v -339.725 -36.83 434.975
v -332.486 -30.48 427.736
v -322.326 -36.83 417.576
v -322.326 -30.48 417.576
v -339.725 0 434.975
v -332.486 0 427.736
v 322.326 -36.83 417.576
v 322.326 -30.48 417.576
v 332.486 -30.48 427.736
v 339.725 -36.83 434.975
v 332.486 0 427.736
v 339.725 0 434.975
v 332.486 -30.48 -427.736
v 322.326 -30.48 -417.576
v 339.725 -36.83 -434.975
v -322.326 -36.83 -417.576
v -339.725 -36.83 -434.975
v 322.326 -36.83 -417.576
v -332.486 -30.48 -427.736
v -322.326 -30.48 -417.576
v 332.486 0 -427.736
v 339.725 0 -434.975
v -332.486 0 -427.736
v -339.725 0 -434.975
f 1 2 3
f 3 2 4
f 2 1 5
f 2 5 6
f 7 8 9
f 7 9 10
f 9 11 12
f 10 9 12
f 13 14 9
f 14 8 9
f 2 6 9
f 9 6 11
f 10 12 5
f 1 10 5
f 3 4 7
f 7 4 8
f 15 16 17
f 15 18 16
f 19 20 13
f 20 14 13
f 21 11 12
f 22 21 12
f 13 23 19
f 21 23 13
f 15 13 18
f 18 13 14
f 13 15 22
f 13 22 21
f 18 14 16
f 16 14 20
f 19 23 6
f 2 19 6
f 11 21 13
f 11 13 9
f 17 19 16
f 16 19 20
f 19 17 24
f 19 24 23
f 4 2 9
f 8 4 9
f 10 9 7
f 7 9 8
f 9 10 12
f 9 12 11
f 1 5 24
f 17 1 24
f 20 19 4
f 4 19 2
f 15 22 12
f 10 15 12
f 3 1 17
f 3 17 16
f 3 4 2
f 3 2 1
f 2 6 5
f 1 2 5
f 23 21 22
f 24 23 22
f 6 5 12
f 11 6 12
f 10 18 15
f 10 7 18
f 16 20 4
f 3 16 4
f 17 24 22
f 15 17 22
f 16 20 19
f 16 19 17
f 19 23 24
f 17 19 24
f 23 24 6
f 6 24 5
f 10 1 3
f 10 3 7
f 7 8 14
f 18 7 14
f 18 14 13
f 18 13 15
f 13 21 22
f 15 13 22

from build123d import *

# Parameters (mm, degrees)
F2_DEPTH = 36.83
F4_DEPTH = 36.83
F5_W     = 664.972
F5_H     = 855.472
F6_DEPTH = 30.48


with BuildPart() as f2:
    # F1 (on face) → F2 (new body)
    with BuildSketch(Plane.XZ):
        Polygon((-339.725, 434.975), (-339.725, -434.975), (-322.326, -417.576), (-322.326, 417.576), align=None)
        Polygon((322.326, -417.576), (339.725, -434.975), (339.725, 434.975), (322.326, 417.576), align=None)
    extrude(amount=F2_DEPTH)


with BuildPart() as f4:
    # F3 (on Front) → F4 (new body, through all)
    with BuildSketch(Plane.XZ):
        Polygon((339.725, 434.975), (-339.725, 434.975), (-322.326, 417.576), (322.326, 417.576), align=None)
        Polygon((-322.326, -417.576), (-339.725, -434.975), (339.725, -434.975), (322.326, -417.576), align=None)
    extrude(amount=F4_DEPTH)


with BuildPart() as f6_tool:
    # F5 (on face) → F6 (new body)
    with BuildSketch(Plane.XZ):
        Rectangle(F5_W, F5_H)
    extrude(amount=F6_DEPTH)


with BuildPart() as f2_1:
    add(f2.part)

    # F6: cut by f6_tool
    add(f6_tool.part, mode=Mode.SUBTRACT)


with BuildPart() as f4_1:
    add(f4.part)

    # F6: cut by f6_tool
    add(f6_tool.part, mode=Mode.SUBTRACT)


solid = Compound([f2_1.part, f4_1.part])
